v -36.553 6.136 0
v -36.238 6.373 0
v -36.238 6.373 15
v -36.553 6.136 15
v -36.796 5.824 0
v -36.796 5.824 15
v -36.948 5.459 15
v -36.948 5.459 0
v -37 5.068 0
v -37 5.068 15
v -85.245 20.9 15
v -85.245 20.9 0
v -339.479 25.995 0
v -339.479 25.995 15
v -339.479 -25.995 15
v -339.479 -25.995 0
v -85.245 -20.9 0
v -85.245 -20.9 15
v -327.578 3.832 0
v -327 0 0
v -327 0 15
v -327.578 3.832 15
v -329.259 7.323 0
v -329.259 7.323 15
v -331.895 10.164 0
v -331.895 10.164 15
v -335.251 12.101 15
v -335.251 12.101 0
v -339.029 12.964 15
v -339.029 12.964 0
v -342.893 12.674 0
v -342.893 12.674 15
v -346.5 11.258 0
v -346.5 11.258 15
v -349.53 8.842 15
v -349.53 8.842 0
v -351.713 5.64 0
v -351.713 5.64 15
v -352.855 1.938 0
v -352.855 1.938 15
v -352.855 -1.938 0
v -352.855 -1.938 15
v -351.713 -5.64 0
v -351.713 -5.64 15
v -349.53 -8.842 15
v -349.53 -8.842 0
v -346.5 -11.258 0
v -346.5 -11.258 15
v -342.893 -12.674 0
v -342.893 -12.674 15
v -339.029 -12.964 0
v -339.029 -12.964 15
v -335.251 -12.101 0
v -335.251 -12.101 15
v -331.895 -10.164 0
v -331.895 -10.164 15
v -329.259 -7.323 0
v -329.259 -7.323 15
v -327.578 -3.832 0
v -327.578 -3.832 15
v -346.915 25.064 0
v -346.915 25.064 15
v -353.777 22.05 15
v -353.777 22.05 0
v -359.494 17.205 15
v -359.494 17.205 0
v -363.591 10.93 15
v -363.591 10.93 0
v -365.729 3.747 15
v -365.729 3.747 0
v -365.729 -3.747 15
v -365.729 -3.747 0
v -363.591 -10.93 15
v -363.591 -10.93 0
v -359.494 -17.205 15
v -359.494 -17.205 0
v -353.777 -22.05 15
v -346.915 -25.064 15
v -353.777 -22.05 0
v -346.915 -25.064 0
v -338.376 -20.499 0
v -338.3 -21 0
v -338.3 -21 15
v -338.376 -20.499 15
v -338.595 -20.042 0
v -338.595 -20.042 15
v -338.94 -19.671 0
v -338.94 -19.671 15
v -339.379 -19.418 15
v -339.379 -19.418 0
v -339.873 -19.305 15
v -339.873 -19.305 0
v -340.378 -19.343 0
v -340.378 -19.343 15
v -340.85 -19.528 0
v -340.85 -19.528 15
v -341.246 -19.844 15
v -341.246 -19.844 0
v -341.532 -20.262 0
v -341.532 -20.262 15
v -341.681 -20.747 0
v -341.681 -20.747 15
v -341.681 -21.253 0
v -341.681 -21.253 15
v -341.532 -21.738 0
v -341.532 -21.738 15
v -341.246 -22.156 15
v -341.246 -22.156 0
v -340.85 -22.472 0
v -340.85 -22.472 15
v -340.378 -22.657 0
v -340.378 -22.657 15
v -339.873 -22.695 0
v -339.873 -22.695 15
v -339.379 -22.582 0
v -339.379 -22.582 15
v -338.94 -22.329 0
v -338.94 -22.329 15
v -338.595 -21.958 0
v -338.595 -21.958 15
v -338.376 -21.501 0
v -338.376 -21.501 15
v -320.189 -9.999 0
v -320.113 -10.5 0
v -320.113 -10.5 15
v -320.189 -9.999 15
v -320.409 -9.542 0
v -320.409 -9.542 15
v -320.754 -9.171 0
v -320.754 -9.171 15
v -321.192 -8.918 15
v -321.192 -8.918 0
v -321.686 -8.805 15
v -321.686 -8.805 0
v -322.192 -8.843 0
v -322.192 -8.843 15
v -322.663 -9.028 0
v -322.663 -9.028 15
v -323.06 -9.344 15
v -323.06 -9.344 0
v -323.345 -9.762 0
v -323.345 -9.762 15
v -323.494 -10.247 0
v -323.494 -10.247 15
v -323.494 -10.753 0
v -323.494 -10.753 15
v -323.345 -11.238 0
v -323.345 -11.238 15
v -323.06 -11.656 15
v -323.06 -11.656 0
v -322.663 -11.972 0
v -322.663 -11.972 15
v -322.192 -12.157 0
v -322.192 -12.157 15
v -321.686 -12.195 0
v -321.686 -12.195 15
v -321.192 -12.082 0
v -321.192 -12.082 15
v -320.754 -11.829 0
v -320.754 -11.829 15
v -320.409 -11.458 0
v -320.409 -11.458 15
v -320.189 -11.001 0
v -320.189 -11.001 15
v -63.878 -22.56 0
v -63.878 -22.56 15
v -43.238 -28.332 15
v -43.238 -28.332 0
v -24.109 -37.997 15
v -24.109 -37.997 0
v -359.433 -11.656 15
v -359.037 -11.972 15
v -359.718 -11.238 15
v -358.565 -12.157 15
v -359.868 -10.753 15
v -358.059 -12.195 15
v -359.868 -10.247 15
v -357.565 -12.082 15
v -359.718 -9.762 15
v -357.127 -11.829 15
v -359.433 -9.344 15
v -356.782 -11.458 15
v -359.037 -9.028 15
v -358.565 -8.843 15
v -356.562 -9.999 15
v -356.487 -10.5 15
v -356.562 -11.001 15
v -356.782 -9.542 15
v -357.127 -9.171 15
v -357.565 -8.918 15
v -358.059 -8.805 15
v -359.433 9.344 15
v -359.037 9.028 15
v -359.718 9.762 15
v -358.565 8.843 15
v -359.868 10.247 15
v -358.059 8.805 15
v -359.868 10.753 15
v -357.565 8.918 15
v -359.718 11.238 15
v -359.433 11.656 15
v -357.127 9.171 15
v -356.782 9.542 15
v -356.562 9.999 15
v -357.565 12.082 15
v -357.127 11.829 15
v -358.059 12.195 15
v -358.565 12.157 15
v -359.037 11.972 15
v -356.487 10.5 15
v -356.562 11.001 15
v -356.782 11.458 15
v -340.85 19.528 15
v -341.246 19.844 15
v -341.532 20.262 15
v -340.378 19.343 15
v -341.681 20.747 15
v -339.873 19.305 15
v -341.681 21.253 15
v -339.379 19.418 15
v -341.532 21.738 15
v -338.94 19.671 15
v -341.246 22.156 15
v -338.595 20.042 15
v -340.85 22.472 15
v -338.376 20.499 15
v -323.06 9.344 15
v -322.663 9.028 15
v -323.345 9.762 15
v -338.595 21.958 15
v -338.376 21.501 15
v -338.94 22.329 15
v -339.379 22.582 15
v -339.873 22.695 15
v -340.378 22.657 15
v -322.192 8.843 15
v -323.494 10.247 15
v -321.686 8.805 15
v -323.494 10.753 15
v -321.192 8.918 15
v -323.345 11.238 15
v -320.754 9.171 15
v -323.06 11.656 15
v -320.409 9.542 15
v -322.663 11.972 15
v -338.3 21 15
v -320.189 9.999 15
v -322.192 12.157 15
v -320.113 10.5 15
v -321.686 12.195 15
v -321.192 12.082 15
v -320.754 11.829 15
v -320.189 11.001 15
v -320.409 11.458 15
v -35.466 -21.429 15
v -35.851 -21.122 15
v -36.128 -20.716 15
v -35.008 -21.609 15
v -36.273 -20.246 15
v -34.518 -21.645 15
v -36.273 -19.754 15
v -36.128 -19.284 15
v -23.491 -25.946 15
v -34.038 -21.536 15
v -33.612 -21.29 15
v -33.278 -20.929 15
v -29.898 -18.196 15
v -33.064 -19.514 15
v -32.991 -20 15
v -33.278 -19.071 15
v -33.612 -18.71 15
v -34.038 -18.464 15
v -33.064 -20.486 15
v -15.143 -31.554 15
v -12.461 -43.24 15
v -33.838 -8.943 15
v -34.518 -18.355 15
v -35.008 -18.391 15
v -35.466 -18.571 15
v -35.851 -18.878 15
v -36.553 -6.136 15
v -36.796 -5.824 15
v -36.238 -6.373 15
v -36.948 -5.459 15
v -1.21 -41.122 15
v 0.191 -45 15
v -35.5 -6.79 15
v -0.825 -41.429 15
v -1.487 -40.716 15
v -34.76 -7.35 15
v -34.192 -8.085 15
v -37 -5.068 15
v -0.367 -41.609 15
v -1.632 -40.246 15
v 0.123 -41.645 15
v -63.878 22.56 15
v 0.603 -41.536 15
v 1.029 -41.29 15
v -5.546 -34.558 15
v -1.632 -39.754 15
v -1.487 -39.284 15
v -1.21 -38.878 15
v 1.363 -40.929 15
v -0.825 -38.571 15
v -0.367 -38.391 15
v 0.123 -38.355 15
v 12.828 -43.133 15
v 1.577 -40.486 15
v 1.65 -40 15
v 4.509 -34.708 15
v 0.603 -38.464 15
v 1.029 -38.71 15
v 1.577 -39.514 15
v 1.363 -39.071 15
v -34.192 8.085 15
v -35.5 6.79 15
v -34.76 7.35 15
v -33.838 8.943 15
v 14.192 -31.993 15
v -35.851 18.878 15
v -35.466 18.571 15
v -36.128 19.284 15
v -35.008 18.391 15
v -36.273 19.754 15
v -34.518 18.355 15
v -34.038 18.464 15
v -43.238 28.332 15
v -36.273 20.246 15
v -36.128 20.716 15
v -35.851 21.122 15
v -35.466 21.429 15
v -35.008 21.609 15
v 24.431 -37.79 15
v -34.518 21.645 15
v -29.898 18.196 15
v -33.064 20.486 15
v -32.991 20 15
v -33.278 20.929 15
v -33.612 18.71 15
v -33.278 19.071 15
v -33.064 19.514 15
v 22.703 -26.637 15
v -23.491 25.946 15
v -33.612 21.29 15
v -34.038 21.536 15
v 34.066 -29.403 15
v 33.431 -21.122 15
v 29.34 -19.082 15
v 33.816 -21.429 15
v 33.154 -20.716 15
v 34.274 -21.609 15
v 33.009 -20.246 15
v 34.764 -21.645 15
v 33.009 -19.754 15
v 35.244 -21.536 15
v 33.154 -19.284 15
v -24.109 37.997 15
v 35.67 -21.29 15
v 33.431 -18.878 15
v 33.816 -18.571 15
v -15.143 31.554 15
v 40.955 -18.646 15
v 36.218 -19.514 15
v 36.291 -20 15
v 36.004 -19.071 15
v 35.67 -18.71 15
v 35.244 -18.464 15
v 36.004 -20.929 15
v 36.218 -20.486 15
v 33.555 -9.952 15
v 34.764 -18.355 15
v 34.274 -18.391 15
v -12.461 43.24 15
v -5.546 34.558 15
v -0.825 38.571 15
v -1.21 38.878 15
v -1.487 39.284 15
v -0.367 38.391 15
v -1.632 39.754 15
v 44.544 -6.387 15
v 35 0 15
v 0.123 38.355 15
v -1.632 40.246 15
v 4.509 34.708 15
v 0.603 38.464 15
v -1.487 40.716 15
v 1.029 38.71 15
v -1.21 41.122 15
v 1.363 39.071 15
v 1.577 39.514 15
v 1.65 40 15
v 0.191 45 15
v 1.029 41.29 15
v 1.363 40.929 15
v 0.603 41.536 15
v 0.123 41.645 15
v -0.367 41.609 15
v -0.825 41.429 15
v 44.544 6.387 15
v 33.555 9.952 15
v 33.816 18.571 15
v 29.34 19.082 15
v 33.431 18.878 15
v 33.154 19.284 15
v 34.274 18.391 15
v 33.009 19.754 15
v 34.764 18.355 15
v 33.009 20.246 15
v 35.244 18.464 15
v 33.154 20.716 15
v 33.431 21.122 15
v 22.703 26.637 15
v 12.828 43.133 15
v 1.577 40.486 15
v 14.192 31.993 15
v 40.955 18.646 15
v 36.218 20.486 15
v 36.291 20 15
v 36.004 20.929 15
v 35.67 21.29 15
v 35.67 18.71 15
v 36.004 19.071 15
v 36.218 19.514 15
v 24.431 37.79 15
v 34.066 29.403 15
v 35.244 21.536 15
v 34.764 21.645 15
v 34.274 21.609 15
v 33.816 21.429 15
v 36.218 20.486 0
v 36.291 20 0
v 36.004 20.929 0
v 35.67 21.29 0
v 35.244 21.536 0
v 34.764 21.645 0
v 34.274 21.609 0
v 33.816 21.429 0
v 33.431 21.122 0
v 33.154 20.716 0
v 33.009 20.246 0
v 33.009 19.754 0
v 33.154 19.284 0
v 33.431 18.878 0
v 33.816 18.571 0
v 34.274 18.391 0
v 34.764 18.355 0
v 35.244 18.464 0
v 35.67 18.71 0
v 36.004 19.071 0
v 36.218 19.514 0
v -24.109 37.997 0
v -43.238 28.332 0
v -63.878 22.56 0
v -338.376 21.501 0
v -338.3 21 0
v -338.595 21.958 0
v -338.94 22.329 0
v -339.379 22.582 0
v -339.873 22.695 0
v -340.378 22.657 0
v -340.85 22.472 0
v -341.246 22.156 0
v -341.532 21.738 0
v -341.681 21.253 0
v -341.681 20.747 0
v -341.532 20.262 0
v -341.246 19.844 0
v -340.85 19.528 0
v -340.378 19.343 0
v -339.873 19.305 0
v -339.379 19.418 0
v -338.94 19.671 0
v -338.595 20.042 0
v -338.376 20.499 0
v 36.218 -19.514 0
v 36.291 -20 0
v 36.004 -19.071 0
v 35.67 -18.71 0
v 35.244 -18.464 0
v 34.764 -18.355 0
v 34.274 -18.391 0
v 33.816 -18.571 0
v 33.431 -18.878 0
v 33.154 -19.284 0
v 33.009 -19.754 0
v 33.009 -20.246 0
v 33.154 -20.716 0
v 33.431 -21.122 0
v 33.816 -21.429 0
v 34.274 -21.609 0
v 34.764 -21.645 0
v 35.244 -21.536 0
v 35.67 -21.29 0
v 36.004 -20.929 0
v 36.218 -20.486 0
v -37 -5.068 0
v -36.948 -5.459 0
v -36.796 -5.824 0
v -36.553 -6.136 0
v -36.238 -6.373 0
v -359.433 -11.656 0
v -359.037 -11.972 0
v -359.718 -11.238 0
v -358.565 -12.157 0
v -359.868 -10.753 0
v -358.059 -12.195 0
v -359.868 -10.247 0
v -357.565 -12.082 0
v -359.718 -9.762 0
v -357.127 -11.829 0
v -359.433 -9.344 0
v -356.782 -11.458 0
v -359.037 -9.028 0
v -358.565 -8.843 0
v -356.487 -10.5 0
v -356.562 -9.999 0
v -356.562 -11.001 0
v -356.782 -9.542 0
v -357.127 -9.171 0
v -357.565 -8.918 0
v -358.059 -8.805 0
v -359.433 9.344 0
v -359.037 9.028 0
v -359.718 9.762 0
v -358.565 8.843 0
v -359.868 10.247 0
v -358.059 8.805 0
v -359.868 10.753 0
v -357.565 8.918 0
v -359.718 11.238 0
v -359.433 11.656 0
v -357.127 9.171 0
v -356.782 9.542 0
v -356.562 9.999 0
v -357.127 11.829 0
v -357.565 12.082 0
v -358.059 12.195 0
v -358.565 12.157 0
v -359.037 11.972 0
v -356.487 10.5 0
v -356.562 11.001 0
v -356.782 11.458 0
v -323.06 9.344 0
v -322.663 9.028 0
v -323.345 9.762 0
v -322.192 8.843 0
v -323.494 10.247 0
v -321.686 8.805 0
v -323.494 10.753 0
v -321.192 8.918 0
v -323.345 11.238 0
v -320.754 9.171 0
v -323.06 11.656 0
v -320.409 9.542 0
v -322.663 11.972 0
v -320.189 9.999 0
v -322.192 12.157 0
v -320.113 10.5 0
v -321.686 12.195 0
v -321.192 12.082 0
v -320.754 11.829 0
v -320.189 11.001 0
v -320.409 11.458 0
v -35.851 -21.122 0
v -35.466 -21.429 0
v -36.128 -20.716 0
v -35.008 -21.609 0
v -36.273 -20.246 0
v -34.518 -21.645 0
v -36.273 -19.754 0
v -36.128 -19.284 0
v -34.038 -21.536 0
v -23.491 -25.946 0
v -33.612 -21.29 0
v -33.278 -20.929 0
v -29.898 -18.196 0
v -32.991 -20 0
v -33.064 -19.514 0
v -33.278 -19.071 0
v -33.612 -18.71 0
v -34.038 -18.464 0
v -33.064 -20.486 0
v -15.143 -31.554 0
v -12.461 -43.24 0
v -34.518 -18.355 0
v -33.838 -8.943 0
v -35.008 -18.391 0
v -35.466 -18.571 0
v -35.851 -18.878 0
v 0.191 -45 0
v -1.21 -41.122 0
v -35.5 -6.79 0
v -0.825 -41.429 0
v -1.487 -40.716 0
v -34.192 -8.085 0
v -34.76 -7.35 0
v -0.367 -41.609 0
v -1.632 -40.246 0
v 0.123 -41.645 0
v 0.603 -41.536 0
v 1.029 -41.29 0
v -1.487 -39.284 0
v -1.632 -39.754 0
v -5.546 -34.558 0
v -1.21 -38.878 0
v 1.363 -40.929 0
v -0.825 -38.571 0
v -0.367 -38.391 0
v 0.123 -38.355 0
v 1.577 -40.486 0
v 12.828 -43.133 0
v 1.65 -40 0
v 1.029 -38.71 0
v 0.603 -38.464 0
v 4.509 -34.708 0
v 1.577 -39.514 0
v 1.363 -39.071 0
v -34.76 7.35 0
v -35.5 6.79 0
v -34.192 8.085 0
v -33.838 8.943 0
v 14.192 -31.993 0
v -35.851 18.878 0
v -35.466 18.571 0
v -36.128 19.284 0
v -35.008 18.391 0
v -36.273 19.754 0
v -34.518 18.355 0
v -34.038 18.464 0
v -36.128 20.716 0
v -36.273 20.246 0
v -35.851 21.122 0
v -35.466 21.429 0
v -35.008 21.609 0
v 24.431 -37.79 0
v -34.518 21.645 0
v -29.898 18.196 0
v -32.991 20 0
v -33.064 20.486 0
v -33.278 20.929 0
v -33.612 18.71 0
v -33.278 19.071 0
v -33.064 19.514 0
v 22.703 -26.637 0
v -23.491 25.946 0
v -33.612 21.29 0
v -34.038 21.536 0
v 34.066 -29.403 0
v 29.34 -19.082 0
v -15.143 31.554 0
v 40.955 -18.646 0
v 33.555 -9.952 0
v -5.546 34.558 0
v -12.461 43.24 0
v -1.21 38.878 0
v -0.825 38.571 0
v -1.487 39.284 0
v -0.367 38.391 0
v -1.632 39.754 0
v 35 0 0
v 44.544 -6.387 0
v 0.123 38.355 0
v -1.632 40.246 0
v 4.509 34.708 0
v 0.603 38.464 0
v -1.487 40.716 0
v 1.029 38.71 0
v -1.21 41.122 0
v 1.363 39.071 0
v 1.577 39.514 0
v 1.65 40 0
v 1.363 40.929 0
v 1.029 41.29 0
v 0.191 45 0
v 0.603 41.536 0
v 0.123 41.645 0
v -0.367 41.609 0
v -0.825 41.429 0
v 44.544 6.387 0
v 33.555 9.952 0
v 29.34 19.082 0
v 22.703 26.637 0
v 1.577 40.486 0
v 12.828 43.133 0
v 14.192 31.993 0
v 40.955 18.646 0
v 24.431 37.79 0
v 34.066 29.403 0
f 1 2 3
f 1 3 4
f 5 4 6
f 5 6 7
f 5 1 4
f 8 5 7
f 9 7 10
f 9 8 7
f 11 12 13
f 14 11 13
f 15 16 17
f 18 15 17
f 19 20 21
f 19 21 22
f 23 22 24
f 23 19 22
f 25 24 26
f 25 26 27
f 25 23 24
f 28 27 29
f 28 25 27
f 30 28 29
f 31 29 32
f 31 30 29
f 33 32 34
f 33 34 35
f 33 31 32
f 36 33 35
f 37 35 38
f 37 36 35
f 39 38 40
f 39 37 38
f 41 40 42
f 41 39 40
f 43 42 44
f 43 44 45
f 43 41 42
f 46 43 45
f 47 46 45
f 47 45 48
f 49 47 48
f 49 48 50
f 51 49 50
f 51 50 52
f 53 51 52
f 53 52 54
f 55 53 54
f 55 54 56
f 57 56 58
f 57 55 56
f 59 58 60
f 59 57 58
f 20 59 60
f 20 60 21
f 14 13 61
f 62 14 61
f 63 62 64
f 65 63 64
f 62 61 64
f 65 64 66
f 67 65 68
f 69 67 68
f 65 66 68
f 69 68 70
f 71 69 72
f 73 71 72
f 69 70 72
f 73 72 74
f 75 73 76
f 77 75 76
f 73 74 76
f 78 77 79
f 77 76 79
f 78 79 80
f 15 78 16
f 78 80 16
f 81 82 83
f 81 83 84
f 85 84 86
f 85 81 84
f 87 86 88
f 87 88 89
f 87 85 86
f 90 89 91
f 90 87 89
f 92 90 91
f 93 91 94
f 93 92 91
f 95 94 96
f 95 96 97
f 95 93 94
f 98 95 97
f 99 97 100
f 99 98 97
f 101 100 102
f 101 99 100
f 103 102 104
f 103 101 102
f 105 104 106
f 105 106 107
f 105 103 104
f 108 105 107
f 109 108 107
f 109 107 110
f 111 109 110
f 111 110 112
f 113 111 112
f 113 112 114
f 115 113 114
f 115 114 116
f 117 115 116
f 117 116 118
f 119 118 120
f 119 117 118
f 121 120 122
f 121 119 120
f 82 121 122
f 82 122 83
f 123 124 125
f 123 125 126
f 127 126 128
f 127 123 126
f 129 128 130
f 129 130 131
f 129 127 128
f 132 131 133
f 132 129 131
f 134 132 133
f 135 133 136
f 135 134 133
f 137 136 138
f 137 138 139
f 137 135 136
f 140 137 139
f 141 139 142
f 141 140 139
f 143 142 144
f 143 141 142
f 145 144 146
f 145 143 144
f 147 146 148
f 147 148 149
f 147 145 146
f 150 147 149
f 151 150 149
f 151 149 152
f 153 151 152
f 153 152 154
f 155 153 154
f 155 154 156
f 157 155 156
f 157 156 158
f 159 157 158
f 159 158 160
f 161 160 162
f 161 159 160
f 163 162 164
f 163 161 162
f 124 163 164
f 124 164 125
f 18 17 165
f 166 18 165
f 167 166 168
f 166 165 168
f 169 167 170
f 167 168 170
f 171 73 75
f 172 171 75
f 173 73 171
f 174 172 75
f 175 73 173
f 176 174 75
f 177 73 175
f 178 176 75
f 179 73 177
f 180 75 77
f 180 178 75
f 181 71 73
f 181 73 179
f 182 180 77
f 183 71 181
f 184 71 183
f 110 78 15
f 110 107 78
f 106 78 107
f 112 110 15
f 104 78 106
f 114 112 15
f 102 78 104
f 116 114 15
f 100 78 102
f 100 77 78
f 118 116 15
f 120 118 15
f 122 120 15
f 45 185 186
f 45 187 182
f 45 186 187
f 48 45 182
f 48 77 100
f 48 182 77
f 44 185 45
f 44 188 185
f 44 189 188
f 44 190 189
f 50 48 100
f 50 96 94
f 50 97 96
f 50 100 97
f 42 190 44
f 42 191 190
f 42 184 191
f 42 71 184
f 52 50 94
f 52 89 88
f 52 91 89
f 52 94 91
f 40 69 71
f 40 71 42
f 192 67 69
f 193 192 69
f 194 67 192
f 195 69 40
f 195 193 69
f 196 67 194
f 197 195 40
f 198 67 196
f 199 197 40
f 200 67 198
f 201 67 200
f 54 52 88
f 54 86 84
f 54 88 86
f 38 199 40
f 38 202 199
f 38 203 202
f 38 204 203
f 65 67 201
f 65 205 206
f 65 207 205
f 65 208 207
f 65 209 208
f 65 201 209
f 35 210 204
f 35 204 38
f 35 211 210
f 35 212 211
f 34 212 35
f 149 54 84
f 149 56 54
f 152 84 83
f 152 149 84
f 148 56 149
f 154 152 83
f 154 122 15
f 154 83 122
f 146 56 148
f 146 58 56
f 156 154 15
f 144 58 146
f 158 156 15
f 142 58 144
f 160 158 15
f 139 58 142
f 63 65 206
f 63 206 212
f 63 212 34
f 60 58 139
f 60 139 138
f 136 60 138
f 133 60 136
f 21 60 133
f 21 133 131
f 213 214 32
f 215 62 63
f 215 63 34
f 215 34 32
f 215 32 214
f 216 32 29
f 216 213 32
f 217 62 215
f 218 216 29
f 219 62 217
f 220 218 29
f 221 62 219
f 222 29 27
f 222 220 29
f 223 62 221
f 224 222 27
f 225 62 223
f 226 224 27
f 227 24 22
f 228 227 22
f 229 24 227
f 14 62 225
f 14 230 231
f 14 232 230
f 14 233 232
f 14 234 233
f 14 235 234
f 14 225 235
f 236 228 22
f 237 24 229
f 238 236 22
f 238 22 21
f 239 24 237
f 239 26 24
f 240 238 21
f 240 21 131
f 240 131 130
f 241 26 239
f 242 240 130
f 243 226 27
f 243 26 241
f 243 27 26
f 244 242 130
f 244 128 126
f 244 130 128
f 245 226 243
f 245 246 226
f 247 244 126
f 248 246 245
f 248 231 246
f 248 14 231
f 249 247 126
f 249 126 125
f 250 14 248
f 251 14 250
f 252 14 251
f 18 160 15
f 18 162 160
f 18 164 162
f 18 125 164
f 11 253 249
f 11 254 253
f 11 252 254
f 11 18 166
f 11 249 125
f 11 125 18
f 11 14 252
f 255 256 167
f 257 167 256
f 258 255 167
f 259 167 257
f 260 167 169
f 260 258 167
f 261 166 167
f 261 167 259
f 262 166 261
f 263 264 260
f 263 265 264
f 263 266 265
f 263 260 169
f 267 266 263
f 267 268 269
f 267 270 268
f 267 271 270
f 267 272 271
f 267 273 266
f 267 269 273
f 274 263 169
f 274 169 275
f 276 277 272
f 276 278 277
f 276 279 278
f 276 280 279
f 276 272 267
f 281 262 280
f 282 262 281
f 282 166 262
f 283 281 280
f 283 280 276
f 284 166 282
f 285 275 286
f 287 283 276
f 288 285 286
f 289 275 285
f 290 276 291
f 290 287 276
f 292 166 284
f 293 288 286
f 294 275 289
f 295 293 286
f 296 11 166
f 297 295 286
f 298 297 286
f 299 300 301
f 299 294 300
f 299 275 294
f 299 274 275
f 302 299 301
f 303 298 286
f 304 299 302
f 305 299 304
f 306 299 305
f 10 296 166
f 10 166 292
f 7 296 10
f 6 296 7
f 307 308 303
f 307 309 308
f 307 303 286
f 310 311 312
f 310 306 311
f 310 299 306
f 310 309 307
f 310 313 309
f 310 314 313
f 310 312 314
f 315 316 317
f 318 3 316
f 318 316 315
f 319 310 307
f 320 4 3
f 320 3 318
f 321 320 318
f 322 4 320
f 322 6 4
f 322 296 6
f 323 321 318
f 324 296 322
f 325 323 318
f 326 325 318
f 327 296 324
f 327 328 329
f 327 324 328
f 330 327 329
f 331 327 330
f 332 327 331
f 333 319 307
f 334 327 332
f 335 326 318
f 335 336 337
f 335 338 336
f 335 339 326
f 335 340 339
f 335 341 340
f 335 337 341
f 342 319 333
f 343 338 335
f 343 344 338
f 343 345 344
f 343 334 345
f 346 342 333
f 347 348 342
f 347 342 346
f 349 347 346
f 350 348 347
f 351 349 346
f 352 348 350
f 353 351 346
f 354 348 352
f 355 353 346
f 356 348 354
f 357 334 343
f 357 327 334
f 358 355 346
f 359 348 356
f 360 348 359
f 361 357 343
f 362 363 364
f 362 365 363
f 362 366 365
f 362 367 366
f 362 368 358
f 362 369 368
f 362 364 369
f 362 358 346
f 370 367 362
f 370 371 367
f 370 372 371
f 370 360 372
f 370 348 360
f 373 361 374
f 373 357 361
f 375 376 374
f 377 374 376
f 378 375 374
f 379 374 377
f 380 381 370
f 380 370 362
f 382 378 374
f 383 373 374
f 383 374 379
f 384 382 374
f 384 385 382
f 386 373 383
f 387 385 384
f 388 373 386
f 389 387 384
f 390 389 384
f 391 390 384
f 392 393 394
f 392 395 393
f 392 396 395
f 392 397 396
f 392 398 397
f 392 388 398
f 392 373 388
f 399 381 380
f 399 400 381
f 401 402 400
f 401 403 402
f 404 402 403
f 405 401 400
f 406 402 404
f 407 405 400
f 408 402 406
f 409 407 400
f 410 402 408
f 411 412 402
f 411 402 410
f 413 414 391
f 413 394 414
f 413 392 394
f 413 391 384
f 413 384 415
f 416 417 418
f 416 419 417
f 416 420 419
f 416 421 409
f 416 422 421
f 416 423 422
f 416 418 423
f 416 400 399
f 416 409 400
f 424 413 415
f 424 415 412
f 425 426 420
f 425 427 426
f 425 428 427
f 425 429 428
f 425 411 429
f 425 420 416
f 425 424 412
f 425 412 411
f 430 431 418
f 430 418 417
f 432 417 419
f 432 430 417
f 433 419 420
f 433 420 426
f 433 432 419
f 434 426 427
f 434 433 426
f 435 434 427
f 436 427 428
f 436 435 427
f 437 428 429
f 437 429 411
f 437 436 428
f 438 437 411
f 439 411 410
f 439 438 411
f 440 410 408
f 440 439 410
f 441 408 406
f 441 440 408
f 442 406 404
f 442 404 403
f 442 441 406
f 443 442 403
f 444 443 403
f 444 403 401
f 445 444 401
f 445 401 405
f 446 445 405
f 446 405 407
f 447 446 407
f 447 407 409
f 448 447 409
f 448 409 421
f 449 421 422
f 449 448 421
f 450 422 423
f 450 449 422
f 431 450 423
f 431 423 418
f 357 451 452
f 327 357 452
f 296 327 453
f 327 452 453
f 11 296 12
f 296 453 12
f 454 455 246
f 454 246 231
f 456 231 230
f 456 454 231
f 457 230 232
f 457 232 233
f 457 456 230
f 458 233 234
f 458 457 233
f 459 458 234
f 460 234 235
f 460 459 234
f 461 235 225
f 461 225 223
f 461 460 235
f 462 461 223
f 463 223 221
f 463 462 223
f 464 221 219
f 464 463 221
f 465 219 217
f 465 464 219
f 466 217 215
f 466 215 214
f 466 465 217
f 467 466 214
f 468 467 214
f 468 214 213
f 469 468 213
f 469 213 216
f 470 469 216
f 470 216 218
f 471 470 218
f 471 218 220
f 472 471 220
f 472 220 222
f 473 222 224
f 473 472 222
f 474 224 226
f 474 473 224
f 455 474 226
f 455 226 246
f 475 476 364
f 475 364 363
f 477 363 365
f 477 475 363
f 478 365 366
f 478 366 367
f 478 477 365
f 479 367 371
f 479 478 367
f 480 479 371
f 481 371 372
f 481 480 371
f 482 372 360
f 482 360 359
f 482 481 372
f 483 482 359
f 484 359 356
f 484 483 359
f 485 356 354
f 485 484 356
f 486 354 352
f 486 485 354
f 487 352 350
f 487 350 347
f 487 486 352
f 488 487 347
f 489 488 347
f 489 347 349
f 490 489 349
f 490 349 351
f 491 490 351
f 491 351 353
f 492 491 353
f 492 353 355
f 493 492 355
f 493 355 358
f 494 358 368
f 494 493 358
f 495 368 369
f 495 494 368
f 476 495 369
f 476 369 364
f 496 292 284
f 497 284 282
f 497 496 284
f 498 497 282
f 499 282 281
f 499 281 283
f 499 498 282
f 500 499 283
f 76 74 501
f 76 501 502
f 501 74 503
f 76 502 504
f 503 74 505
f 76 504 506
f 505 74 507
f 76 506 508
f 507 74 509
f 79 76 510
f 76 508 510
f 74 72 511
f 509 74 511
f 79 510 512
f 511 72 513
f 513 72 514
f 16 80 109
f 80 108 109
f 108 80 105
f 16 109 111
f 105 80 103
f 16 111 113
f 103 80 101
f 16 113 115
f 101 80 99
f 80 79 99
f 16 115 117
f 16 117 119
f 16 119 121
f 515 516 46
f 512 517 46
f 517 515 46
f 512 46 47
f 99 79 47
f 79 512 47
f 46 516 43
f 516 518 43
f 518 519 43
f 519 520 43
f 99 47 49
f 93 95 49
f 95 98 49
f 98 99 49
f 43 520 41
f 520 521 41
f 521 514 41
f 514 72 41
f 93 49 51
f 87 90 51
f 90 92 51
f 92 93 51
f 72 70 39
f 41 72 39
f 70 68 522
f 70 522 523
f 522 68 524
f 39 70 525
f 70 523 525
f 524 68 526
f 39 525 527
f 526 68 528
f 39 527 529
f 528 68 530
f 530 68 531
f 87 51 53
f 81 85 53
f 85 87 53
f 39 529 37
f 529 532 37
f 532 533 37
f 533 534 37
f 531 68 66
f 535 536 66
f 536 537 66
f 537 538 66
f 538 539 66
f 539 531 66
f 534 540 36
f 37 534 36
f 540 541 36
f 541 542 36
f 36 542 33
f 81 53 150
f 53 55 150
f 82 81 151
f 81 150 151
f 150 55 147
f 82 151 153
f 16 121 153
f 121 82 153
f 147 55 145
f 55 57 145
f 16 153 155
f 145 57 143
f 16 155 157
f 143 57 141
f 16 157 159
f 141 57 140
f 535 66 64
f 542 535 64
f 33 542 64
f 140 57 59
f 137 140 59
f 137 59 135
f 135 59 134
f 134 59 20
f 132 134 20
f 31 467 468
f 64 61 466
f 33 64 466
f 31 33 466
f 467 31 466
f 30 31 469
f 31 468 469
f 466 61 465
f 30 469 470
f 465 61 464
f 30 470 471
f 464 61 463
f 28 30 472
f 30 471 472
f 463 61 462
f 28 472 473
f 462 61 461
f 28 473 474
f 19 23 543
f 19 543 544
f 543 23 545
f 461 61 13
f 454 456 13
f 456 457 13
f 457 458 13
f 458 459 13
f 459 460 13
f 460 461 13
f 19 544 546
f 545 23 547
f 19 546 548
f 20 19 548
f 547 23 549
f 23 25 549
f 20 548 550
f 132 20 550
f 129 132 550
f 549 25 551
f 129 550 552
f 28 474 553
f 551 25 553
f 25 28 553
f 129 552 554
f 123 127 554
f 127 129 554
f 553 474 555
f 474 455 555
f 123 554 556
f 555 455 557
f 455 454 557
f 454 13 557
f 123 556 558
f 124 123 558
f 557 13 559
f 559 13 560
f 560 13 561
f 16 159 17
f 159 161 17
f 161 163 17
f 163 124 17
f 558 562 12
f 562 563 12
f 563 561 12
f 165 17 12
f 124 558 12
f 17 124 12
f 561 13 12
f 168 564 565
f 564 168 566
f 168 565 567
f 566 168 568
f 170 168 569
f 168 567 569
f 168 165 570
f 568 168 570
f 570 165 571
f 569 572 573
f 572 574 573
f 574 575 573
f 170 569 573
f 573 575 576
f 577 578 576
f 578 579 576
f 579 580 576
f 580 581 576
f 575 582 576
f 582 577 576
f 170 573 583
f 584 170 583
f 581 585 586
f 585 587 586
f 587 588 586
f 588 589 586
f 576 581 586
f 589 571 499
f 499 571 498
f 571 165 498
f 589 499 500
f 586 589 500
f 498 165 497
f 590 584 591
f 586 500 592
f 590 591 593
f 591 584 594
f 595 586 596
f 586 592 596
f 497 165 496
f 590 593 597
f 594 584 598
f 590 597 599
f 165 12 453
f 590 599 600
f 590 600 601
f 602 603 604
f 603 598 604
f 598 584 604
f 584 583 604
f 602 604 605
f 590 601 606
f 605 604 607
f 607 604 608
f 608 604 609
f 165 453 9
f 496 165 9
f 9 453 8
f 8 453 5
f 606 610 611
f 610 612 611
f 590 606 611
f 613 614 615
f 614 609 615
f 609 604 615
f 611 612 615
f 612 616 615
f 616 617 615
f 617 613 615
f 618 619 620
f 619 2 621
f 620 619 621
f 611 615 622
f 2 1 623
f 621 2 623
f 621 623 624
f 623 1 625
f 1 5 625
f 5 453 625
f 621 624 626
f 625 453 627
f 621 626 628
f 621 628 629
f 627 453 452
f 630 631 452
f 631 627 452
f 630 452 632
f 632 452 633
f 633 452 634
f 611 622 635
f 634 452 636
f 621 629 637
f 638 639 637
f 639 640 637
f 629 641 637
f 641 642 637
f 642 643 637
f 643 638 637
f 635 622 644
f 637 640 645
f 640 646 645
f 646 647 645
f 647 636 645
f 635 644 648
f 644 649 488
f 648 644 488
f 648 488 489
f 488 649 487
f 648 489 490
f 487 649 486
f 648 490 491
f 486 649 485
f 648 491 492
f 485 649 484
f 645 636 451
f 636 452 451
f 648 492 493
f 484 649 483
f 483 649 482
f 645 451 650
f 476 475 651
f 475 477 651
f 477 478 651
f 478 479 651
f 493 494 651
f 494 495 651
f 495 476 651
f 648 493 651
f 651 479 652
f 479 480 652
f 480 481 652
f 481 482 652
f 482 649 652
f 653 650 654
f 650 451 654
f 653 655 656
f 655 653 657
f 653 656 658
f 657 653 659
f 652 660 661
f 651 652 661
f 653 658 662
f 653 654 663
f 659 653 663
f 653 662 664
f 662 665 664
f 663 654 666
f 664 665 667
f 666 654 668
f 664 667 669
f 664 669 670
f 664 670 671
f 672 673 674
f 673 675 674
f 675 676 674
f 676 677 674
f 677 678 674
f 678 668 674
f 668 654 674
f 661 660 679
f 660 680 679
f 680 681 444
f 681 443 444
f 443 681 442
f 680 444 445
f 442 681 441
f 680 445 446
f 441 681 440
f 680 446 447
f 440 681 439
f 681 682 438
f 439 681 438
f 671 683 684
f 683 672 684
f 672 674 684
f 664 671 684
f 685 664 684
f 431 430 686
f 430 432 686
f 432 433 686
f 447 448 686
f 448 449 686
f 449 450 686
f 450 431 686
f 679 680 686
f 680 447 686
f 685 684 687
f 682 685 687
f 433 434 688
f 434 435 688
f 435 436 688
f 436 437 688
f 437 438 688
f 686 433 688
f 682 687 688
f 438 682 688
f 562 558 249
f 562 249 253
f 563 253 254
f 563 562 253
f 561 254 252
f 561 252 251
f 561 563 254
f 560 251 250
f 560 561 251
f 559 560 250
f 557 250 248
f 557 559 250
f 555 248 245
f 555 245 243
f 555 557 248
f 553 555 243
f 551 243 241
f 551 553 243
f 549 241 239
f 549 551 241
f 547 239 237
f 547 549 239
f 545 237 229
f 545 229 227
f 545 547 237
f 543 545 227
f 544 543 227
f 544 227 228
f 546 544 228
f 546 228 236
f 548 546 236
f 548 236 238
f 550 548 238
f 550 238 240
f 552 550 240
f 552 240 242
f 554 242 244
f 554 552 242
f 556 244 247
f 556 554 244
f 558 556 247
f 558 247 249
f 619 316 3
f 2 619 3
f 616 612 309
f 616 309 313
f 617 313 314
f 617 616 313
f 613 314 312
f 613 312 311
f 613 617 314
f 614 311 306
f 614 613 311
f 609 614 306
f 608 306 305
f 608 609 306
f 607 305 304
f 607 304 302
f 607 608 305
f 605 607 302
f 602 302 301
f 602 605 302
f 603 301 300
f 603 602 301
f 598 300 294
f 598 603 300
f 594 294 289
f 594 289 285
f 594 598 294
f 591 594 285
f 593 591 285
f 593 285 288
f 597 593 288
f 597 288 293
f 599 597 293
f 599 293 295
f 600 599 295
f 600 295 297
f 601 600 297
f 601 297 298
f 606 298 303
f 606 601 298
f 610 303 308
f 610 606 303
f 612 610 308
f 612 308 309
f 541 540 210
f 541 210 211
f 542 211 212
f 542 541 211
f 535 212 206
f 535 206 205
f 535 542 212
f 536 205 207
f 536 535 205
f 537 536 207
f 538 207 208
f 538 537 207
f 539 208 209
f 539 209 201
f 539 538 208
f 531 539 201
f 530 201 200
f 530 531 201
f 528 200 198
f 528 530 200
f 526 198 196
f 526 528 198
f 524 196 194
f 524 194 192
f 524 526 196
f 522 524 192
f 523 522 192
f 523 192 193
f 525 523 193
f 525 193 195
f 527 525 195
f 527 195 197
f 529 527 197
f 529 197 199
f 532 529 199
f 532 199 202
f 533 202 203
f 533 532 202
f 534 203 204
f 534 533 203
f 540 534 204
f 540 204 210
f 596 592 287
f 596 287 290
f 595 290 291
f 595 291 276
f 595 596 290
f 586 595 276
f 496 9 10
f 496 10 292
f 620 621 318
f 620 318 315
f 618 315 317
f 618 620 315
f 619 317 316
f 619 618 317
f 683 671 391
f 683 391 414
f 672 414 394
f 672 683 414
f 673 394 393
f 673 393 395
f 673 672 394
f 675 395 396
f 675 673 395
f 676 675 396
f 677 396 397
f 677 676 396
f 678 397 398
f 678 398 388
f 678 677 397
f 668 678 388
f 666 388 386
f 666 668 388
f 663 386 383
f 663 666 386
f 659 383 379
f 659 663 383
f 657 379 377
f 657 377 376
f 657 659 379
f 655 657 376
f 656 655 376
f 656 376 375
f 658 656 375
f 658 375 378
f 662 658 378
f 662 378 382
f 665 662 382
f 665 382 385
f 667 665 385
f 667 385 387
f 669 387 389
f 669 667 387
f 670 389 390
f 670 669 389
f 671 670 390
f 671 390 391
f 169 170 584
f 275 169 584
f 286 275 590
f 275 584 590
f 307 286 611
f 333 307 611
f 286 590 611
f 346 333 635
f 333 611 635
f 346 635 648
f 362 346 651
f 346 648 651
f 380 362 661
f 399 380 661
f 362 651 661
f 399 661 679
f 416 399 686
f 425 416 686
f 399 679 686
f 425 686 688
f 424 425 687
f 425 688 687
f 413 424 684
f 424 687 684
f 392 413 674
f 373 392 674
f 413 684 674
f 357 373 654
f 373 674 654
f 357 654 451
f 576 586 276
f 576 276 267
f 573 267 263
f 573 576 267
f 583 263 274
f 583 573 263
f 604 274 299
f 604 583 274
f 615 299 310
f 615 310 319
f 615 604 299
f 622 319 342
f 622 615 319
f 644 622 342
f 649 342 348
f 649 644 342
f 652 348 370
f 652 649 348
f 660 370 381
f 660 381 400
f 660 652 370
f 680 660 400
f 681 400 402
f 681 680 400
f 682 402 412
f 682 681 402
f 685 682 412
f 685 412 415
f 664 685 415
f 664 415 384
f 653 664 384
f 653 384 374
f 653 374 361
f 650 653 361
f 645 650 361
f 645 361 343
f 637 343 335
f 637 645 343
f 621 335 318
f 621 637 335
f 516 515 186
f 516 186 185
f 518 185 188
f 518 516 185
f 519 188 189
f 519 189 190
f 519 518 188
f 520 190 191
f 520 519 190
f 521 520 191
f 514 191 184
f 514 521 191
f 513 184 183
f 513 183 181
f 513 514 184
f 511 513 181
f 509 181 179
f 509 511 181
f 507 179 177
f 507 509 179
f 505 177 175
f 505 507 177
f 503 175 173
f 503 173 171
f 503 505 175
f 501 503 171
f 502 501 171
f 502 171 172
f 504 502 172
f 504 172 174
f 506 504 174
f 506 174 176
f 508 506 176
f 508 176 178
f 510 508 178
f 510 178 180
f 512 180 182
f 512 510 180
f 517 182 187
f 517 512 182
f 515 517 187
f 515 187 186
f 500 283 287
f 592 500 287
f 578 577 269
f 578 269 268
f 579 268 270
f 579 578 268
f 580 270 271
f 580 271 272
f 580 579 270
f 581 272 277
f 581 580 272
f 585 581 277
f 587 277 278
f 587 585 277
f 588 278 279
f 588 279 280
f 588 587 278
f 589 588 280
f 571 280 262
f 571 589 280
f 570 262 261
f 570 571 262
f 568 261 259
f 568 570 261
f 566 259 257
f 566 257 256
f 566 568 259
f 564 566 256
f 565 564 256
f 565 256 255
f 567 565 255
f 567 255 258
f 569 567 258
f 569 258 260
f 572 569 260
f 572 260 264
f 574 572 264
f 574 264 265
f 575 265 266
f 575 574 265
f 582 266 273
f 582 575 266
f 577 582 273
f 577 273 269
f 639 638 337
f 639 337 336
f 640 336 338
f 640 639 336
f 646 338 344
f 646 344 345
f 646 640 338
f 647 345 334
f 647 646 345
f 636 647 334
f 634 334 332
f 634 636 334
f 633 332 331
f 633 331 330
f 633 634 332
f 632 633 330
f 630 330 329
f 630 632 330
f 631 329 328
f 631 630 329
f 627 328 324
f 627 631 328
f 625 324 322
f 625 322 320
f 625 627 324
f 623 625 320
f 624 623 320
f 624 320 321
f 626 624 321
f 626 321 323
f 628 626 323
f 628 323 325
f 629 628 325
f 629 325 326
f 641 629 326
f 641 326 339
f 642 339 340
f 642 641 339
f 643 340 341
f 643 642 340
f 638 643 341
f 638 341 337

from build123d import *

# Parameters (mm, degrees)
SKETCH_1_R      = 1.65
SKETCH_1_R_2    = 13
SKETCH_1_R_3    = 1.7
EXTRUDE_1_DEPTH = 15


with BuildPart() as part:
    # 草图1 → 凸台-拉伸1 (new body)
    with BuildSketch(Plane.XY):
        with BuildLine():
            Line((-85.245113537, 20.900392521), (-339.479111624, 25.994781694))
            ThreePointArc((-339.479111624, 25.994781694), (-366, 0), (-339.479111624, -25.994781694))
            Line((-339.479111624, -25.994781694), (-85.245113537, -20.900392521))
            ThreePointArc((-85.245113537, -20.900392521), (-53.416829007, -24.942544633), (-24.108780491, -37.996930182))
            ThreePointArc((-24.108780491, -37.996930182), (45, 0), (-24.108780491, 37.996930182))
            ThreePointArc((-24.108780491, 37.996930182), (-53.416829007, 24.942544633), (-85.245113537, 20.900392521))
        make_face()
        with Locations((0, 40)):
            Circle(SKETCH_1_R, mode=Mode.SUBTRACT)
        with Locations((34.641016151, 20)):
            Circle(SKETCH_1_R, mode=Mode.SUBTRACT)
        with Locations((34.641016151, -20)):
            Circle(SKETCH_1_R, mode=Mode.SUBTRACT)
        with Locations((0, -40)):
            Circle(SKETCH_1_R, mode=Mode.SUBTRACT)
        with Locations((-34.641016151, 20)):
            Circle(SKETCH_1_R, mode=Mode.SUBTRACT)
        with Locations((-34.641016151, -20)):
            Circle(SKETCH_1_R, mode=Mode.SUBTRACT)
        with Locations((-340, 0)):
            Circle(SKETCH_1_R_2, mode=Mode.SUBTRACT)
        with Locations((-340, 21)):
            Circle(SKETCH_1_R_3, mode=Mode.SUBTRACT)
        with Locations((-358.186533479, 10.5)):
            Circle(SKETCH_1_R_3, mode=Mode.SUBTRACT)
        with Locations((-358.186533479, -10.5)):
            Circle(SKETCH_1_R_3, mode=Mode.SUBTRACT)
        with Locations((-340, -21)):
            Circle(SKETCH_1_R_3, mode=Mode.SUBTRACT)
        with Locations((-321.813466521, -10.5)):
            Circle(SKETCH_1_R_3, mode=Mode.SUBTRACT)
        with Locations((-321.813466521, 10.5)):
            Circle(SKETCH_1_R_3, mode=Mode.SUBTRACT)
        with BuildLine():
            Line((-35.500051413, 6.790401018), (-36.237951224, 6.373427606))
            ThreePointArc((-36.237951224, 6.373427606), (-36.795555255, 5.823507629), (-37, 5.067507244))
            Line((-37, 5.067507244), (-37, -5.067507244))
            ThreePointArc((-37, -5.067507244), (-36.795555255, -5.823507629), (-36.237951224, -6.373427606))
            Line((-36.237951224, -6.373427606), (-35.500051413, -6.790401018))
            ThreePointArc((-35.500051413, -6.790401018), (-34.451431588, -7.698788042), (-33.838125094, -8.943225935))
            ThreePointArc((-33.838125094, -8.943225935), (35, 0), (-33.838125094, 8.943225935))
            ThreePointArc((-33.838125094, 8.943225935), (-34.451431588, 7.698788042), (-35.500051413, 6.790401018))
        make_face(mode=Mode.SUBTRACT)
    extrude(amount=EXTRUDE_1_DEPTH)


solid = part.part
